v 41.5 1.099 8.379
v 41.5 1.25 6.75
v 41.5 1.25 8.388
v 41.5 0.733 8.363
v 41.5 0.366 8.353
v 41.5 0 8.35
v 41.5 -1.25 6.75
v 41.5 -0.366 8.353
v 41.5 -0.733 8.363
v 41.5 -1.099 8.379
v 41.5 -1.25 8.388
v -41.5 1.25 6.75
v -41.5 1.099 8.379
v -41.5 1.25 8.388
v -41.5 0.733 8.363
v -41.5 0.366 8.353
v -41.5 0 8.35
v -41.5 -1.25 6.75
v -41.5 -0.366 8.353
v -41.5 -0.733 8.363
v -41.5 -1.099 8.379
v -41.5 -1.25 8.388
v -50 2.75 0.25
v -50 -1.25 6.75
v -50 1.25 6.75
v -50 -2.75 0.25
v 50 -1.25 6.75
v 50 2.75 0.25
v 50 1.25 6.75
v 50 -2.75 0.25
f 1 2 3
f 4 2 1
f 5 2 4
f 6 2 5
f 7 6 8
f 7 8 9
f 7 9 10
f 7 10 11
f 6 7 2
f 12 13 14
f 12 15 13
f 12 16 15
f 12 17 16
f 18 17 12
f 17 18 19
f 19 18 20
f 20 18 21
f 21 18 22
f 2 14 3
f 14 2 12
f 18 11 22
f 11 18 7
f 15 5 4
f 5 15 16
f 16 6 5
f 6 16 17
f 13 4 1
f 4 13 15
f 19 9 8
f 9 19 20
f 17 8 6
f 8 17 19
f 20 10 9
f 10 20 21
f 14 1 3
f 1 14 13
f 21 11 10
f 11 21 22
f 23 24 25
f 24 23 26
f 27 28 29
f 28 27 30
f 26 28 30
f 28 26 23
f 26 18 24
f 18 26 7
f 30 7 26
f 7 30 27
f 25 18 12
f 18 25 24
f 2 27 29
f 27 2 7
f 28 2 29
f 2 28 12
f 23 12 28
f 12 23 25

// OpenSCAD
//amplified_end_cap();

translate([0,0, 5])
rotate([0,90,0])
amp_post();


module amplified_end_cap() {
    cap_radius = 21;
    cap_height = 8.5;
    tube_hieght = 83;
    post_width = 3;
    post_depth = 6;
    post_hieght = tube_hieght+cap_height;
    wall = 3;
    r = cap_radius + wall;
    a = r*sqrt(3)/2;
    
    difference() {
        union() {
            difference() {
                translate([0,0,0])
                rotate([0,180,0]) end_cap(cap_radius, cap_height);
                
                translate([0,0,-1])
                linear_extrude(height = cap_height+2, center = false, convexity = 10, twist = 0) hexagon(cap_radius);
            }
            
            translate([r,0,post_hieght/2])
            rotate([0,0,0])
            socket(post_depth, post_width, post_hieght);
            
            translate([r/2,a,post_hieght/2])
            rotate([0,0,60])
            socket(post_depth, post_width, post_hieght);
            
            translate([-r/2,a,post_hieght/2])
            rotate([0,0,120])
            socket(post_depth, post_width, post_hieght);
            
            translate([-r,0,post_hieght/2])
            rotate([0,0,180])
            socket(post_depth, post_width, post_hieght);
            
            translate([-r/2,-a,post_hieght/2])
            rotate([0,0,240])
            socket(post_depth, post_width, post_hieght);
            
            translate([r/2,-a,post_hieght/2])
            rotate([0,0,300])
            socket(post_depth, post_width, post_hieght);
        }
    
        translate([r,0,4.25])
        rotate([0,0,0])
        socket_tool();
        
        translate([r/2,a,4.25])
        rotate([0,0,60])
        socket_tool();
        
        translate([-r/2,a,4.25])
        rotate([0,0,120])
        socket_tool();
        
        translate([-r,0,4.25])
        rotate([0,0,180])
        socket_tool();
        
        translate([-r/2,-a,4.25])
        rotate([0,0,240])
        socket_tool();
        
        translate([r/2,-a,4.25])
        rotate([0,0,300])
        translate([0,0,0])
        socket_tool();
    }
    
    
}

module amp_post() {
    buffer = 0.25;
    height = 83+(8.5*2);
    linear_extrude(height = height, center = true, convexity = 10, twist = 0)
    polygon(points=[[5 - buffer,3-buffer], [5-buffer,-3+buffer], [-2+buffer,-1.5+buffer], [-2+buffer,1.5-buffer]]);
    difference(){
        translate([-2,0,0])
        cube([6, 3-(2*buffer), 83], center=true);
        
        translate([-24.35,0,0])
        cylinder(height, 21, 21, center=true, $fn=360);
    }
}

module socket_tool() {
    linear_extrude(height = 10, center = true, convexity = 10, twist = 0)
    polygon(points=[[5,3], [5,-3], [-2,-1.5], [-2,1.5]]);
}

module socket(post_depth, post_width, post_hieght) {
    hull() {
        
        //translate([0,0,-post_hieght/2 + 4.25])
        //linear_extrude(height = 8.5, center = true, convexity = 10, twist = 0)
        //polygon(points=[[6,4], [6,-4], [-3,-3], [-3,3]]);
        
        translate([7.6, 9.5,-post_hieght/2 + 4.25])
        dowel(2, 8.5);
        
        translate([7.6, -9.5,-post_hieght/2 + 4.25])
        dowel(2, 8.5);
        
        translate([-2, -3,-post_hieght/2 + 4.25])
        dowel(2, 8.5);
        
        translate([-2, 3,-post_hieght/2 + 4.25])
        dowel(2, 8.5);
    }
}

module open_end_cap() {
cap_radius = 21;
cap_height = 8.5;
/*
translate([70,0,0])
rotate([0,180,0]) end_cap(cap_radius, cap_height);
*/
    
difference() {
    translate([0,0,0])
    rotate([0,180,0]) end_cap(cap_radius, cap_height);
    
    translate([0,0,-1])
    linear_extrude(height = cap_height+2, center = false, convexity = 10, twist = 0) hexagon(cap_radius);
}
}

module end_cap(rad, height) {
    clip_height = rad;
    clip_width = height;
    clip_depth = 15;
    clip_wall = 3;
    clip_lip = 5.5;
    clip_lip_slope = 0.80;
    radius = clip_height;
    inner_radius = radius * sqrt(3)/2;

    translate([0, inner_radius, 0]) rotate([180,0,0])
    end_clip(clip_depth, clip_width, clip_height, clip_wall, clip_lip, clip_lip_slope);

    translate([-inner_radius*cos(30), inner_radius*cos(60), 0]) rotate([180,0,60])
    end_clip(clip_depth, clip_width, clip_height, clip_wall, clip_lip, clip_lip_slope);

    translate([-inner_radius*cos(30), -inner_radius*cos(60), 0]) rotate([180,0,120])
    end_clip(clip_depth, clip_width, clip_height, clip_wall, clip_lip, clip_lip_slope);

    translate([0, -inner_radius, 0]) rotate([180,0,180])
    end_clip(clip_depth, clip_width, clip_height, clip_wall, clip_lip, clip_lip_slope);

    translate([inner_radius*cos(30), -inner_radius*cos(60), 0]) rotate([180,0,240])
    end_clip(clip_depth, clip_width, clip_height, clip_wall, clip_lip, clip_lip_slope);

    translate([inner_radius*cos(30), inner_radius*cos(60), 0]) rotate([180,0,300])
    end_clip(clip_depth, clip_width, clip_height, clip_wall, clip_lip, clip_lip_slope);

    difference () {
        rotate([0,180,0]) linear_extrude(height = clip_width, center = false, convexity = 10, twist = 0) hexagon(radius+clip_wall);
        /*translate([0,0,1]) rotate([0,180,0]) linear_extrude(height = 13, center = false, convexity = 10, twist = 0) hexagon(radius);*/
        translate([0,0,1])
        rotate([0,180,0])
        cylinder(h = clip_width+20, r1 = 7.5, r2 = 7.5, $fn=36, center = false);
    }
}


module end_clip(x, y, z, wall, lip, slope) {
    inner_x = x - (2*wall);
    inner_z = z - (2*wall);
    outter_x = x-wall;
    outter_z = z-wall;
    gap = 8.0;
    
    rotate([90,0,90])
    translate([-x/2, y/2, 0])
    union() {
    difference() {
        hull() {
            translate([-outter_x/2, 0, -outter_z/2+(wall/2)]) rotate([90,0,0])
            dowel(wall, y);
            translate([outter_x/2, 0, -outter_z/2]) rotate([90,0,0])
            dowel(wall, y);
            translate([-outter_x/2, 0, outter_z/2-(wall/2)]) rotate([90,0,0])
            dowel(wall, y);
            translate([outter_x/2, 0, outter_z/2]) rotate([90,0,0])
            dowel(wall, y);
            }
  
        translate([0, 0, 0])
        cube([inner_x, y, inner_z],center=true);
        translate([-wall-1,0,0]) cube([inner_x+1,y+wall, gap],center=true);
            translate([-inner_x/2, -(y+1)/2, gap/2-0.1]) rotate([0,0,90]) prism(y+wall, y, y*slope);
        translate([-inner_x/2,  (y+1)/2, -gap/2+0.1]) rotate([0,180,90]) prism(y+wall, y, y*slope);
        }
        
    }
    
}

module dowel(w,h) {
    cylinder(h = h, r1 = w/2, r2 = w/2, $fn=36, center = true);
    /*translate([0,0,(h-w)/2])
    sphere(d = w, $fn=36);
    translate([0,0,-(h-w)/2])
    sphere(d = w, $fn=36);*/
}

module prism(l, w, h){
    polyhedron(
        points=[[0,0,0], [l,0,0], [l,w,0], [0,w,0], [0,w,h], [l,w,h]],
        faces=[[0,1,2,3],[5,4,3,2],[0,4,5,1],[0,3,4],[5,2,1]]
    );
}

module hexagon(a){
    h = a*sqrt(3)/2;
    polygon(
        points=[[a,0], [a/2,h], [-a/2,h], [-a,0], [-a/2,-h], [a/2,-h]]
    );
}
